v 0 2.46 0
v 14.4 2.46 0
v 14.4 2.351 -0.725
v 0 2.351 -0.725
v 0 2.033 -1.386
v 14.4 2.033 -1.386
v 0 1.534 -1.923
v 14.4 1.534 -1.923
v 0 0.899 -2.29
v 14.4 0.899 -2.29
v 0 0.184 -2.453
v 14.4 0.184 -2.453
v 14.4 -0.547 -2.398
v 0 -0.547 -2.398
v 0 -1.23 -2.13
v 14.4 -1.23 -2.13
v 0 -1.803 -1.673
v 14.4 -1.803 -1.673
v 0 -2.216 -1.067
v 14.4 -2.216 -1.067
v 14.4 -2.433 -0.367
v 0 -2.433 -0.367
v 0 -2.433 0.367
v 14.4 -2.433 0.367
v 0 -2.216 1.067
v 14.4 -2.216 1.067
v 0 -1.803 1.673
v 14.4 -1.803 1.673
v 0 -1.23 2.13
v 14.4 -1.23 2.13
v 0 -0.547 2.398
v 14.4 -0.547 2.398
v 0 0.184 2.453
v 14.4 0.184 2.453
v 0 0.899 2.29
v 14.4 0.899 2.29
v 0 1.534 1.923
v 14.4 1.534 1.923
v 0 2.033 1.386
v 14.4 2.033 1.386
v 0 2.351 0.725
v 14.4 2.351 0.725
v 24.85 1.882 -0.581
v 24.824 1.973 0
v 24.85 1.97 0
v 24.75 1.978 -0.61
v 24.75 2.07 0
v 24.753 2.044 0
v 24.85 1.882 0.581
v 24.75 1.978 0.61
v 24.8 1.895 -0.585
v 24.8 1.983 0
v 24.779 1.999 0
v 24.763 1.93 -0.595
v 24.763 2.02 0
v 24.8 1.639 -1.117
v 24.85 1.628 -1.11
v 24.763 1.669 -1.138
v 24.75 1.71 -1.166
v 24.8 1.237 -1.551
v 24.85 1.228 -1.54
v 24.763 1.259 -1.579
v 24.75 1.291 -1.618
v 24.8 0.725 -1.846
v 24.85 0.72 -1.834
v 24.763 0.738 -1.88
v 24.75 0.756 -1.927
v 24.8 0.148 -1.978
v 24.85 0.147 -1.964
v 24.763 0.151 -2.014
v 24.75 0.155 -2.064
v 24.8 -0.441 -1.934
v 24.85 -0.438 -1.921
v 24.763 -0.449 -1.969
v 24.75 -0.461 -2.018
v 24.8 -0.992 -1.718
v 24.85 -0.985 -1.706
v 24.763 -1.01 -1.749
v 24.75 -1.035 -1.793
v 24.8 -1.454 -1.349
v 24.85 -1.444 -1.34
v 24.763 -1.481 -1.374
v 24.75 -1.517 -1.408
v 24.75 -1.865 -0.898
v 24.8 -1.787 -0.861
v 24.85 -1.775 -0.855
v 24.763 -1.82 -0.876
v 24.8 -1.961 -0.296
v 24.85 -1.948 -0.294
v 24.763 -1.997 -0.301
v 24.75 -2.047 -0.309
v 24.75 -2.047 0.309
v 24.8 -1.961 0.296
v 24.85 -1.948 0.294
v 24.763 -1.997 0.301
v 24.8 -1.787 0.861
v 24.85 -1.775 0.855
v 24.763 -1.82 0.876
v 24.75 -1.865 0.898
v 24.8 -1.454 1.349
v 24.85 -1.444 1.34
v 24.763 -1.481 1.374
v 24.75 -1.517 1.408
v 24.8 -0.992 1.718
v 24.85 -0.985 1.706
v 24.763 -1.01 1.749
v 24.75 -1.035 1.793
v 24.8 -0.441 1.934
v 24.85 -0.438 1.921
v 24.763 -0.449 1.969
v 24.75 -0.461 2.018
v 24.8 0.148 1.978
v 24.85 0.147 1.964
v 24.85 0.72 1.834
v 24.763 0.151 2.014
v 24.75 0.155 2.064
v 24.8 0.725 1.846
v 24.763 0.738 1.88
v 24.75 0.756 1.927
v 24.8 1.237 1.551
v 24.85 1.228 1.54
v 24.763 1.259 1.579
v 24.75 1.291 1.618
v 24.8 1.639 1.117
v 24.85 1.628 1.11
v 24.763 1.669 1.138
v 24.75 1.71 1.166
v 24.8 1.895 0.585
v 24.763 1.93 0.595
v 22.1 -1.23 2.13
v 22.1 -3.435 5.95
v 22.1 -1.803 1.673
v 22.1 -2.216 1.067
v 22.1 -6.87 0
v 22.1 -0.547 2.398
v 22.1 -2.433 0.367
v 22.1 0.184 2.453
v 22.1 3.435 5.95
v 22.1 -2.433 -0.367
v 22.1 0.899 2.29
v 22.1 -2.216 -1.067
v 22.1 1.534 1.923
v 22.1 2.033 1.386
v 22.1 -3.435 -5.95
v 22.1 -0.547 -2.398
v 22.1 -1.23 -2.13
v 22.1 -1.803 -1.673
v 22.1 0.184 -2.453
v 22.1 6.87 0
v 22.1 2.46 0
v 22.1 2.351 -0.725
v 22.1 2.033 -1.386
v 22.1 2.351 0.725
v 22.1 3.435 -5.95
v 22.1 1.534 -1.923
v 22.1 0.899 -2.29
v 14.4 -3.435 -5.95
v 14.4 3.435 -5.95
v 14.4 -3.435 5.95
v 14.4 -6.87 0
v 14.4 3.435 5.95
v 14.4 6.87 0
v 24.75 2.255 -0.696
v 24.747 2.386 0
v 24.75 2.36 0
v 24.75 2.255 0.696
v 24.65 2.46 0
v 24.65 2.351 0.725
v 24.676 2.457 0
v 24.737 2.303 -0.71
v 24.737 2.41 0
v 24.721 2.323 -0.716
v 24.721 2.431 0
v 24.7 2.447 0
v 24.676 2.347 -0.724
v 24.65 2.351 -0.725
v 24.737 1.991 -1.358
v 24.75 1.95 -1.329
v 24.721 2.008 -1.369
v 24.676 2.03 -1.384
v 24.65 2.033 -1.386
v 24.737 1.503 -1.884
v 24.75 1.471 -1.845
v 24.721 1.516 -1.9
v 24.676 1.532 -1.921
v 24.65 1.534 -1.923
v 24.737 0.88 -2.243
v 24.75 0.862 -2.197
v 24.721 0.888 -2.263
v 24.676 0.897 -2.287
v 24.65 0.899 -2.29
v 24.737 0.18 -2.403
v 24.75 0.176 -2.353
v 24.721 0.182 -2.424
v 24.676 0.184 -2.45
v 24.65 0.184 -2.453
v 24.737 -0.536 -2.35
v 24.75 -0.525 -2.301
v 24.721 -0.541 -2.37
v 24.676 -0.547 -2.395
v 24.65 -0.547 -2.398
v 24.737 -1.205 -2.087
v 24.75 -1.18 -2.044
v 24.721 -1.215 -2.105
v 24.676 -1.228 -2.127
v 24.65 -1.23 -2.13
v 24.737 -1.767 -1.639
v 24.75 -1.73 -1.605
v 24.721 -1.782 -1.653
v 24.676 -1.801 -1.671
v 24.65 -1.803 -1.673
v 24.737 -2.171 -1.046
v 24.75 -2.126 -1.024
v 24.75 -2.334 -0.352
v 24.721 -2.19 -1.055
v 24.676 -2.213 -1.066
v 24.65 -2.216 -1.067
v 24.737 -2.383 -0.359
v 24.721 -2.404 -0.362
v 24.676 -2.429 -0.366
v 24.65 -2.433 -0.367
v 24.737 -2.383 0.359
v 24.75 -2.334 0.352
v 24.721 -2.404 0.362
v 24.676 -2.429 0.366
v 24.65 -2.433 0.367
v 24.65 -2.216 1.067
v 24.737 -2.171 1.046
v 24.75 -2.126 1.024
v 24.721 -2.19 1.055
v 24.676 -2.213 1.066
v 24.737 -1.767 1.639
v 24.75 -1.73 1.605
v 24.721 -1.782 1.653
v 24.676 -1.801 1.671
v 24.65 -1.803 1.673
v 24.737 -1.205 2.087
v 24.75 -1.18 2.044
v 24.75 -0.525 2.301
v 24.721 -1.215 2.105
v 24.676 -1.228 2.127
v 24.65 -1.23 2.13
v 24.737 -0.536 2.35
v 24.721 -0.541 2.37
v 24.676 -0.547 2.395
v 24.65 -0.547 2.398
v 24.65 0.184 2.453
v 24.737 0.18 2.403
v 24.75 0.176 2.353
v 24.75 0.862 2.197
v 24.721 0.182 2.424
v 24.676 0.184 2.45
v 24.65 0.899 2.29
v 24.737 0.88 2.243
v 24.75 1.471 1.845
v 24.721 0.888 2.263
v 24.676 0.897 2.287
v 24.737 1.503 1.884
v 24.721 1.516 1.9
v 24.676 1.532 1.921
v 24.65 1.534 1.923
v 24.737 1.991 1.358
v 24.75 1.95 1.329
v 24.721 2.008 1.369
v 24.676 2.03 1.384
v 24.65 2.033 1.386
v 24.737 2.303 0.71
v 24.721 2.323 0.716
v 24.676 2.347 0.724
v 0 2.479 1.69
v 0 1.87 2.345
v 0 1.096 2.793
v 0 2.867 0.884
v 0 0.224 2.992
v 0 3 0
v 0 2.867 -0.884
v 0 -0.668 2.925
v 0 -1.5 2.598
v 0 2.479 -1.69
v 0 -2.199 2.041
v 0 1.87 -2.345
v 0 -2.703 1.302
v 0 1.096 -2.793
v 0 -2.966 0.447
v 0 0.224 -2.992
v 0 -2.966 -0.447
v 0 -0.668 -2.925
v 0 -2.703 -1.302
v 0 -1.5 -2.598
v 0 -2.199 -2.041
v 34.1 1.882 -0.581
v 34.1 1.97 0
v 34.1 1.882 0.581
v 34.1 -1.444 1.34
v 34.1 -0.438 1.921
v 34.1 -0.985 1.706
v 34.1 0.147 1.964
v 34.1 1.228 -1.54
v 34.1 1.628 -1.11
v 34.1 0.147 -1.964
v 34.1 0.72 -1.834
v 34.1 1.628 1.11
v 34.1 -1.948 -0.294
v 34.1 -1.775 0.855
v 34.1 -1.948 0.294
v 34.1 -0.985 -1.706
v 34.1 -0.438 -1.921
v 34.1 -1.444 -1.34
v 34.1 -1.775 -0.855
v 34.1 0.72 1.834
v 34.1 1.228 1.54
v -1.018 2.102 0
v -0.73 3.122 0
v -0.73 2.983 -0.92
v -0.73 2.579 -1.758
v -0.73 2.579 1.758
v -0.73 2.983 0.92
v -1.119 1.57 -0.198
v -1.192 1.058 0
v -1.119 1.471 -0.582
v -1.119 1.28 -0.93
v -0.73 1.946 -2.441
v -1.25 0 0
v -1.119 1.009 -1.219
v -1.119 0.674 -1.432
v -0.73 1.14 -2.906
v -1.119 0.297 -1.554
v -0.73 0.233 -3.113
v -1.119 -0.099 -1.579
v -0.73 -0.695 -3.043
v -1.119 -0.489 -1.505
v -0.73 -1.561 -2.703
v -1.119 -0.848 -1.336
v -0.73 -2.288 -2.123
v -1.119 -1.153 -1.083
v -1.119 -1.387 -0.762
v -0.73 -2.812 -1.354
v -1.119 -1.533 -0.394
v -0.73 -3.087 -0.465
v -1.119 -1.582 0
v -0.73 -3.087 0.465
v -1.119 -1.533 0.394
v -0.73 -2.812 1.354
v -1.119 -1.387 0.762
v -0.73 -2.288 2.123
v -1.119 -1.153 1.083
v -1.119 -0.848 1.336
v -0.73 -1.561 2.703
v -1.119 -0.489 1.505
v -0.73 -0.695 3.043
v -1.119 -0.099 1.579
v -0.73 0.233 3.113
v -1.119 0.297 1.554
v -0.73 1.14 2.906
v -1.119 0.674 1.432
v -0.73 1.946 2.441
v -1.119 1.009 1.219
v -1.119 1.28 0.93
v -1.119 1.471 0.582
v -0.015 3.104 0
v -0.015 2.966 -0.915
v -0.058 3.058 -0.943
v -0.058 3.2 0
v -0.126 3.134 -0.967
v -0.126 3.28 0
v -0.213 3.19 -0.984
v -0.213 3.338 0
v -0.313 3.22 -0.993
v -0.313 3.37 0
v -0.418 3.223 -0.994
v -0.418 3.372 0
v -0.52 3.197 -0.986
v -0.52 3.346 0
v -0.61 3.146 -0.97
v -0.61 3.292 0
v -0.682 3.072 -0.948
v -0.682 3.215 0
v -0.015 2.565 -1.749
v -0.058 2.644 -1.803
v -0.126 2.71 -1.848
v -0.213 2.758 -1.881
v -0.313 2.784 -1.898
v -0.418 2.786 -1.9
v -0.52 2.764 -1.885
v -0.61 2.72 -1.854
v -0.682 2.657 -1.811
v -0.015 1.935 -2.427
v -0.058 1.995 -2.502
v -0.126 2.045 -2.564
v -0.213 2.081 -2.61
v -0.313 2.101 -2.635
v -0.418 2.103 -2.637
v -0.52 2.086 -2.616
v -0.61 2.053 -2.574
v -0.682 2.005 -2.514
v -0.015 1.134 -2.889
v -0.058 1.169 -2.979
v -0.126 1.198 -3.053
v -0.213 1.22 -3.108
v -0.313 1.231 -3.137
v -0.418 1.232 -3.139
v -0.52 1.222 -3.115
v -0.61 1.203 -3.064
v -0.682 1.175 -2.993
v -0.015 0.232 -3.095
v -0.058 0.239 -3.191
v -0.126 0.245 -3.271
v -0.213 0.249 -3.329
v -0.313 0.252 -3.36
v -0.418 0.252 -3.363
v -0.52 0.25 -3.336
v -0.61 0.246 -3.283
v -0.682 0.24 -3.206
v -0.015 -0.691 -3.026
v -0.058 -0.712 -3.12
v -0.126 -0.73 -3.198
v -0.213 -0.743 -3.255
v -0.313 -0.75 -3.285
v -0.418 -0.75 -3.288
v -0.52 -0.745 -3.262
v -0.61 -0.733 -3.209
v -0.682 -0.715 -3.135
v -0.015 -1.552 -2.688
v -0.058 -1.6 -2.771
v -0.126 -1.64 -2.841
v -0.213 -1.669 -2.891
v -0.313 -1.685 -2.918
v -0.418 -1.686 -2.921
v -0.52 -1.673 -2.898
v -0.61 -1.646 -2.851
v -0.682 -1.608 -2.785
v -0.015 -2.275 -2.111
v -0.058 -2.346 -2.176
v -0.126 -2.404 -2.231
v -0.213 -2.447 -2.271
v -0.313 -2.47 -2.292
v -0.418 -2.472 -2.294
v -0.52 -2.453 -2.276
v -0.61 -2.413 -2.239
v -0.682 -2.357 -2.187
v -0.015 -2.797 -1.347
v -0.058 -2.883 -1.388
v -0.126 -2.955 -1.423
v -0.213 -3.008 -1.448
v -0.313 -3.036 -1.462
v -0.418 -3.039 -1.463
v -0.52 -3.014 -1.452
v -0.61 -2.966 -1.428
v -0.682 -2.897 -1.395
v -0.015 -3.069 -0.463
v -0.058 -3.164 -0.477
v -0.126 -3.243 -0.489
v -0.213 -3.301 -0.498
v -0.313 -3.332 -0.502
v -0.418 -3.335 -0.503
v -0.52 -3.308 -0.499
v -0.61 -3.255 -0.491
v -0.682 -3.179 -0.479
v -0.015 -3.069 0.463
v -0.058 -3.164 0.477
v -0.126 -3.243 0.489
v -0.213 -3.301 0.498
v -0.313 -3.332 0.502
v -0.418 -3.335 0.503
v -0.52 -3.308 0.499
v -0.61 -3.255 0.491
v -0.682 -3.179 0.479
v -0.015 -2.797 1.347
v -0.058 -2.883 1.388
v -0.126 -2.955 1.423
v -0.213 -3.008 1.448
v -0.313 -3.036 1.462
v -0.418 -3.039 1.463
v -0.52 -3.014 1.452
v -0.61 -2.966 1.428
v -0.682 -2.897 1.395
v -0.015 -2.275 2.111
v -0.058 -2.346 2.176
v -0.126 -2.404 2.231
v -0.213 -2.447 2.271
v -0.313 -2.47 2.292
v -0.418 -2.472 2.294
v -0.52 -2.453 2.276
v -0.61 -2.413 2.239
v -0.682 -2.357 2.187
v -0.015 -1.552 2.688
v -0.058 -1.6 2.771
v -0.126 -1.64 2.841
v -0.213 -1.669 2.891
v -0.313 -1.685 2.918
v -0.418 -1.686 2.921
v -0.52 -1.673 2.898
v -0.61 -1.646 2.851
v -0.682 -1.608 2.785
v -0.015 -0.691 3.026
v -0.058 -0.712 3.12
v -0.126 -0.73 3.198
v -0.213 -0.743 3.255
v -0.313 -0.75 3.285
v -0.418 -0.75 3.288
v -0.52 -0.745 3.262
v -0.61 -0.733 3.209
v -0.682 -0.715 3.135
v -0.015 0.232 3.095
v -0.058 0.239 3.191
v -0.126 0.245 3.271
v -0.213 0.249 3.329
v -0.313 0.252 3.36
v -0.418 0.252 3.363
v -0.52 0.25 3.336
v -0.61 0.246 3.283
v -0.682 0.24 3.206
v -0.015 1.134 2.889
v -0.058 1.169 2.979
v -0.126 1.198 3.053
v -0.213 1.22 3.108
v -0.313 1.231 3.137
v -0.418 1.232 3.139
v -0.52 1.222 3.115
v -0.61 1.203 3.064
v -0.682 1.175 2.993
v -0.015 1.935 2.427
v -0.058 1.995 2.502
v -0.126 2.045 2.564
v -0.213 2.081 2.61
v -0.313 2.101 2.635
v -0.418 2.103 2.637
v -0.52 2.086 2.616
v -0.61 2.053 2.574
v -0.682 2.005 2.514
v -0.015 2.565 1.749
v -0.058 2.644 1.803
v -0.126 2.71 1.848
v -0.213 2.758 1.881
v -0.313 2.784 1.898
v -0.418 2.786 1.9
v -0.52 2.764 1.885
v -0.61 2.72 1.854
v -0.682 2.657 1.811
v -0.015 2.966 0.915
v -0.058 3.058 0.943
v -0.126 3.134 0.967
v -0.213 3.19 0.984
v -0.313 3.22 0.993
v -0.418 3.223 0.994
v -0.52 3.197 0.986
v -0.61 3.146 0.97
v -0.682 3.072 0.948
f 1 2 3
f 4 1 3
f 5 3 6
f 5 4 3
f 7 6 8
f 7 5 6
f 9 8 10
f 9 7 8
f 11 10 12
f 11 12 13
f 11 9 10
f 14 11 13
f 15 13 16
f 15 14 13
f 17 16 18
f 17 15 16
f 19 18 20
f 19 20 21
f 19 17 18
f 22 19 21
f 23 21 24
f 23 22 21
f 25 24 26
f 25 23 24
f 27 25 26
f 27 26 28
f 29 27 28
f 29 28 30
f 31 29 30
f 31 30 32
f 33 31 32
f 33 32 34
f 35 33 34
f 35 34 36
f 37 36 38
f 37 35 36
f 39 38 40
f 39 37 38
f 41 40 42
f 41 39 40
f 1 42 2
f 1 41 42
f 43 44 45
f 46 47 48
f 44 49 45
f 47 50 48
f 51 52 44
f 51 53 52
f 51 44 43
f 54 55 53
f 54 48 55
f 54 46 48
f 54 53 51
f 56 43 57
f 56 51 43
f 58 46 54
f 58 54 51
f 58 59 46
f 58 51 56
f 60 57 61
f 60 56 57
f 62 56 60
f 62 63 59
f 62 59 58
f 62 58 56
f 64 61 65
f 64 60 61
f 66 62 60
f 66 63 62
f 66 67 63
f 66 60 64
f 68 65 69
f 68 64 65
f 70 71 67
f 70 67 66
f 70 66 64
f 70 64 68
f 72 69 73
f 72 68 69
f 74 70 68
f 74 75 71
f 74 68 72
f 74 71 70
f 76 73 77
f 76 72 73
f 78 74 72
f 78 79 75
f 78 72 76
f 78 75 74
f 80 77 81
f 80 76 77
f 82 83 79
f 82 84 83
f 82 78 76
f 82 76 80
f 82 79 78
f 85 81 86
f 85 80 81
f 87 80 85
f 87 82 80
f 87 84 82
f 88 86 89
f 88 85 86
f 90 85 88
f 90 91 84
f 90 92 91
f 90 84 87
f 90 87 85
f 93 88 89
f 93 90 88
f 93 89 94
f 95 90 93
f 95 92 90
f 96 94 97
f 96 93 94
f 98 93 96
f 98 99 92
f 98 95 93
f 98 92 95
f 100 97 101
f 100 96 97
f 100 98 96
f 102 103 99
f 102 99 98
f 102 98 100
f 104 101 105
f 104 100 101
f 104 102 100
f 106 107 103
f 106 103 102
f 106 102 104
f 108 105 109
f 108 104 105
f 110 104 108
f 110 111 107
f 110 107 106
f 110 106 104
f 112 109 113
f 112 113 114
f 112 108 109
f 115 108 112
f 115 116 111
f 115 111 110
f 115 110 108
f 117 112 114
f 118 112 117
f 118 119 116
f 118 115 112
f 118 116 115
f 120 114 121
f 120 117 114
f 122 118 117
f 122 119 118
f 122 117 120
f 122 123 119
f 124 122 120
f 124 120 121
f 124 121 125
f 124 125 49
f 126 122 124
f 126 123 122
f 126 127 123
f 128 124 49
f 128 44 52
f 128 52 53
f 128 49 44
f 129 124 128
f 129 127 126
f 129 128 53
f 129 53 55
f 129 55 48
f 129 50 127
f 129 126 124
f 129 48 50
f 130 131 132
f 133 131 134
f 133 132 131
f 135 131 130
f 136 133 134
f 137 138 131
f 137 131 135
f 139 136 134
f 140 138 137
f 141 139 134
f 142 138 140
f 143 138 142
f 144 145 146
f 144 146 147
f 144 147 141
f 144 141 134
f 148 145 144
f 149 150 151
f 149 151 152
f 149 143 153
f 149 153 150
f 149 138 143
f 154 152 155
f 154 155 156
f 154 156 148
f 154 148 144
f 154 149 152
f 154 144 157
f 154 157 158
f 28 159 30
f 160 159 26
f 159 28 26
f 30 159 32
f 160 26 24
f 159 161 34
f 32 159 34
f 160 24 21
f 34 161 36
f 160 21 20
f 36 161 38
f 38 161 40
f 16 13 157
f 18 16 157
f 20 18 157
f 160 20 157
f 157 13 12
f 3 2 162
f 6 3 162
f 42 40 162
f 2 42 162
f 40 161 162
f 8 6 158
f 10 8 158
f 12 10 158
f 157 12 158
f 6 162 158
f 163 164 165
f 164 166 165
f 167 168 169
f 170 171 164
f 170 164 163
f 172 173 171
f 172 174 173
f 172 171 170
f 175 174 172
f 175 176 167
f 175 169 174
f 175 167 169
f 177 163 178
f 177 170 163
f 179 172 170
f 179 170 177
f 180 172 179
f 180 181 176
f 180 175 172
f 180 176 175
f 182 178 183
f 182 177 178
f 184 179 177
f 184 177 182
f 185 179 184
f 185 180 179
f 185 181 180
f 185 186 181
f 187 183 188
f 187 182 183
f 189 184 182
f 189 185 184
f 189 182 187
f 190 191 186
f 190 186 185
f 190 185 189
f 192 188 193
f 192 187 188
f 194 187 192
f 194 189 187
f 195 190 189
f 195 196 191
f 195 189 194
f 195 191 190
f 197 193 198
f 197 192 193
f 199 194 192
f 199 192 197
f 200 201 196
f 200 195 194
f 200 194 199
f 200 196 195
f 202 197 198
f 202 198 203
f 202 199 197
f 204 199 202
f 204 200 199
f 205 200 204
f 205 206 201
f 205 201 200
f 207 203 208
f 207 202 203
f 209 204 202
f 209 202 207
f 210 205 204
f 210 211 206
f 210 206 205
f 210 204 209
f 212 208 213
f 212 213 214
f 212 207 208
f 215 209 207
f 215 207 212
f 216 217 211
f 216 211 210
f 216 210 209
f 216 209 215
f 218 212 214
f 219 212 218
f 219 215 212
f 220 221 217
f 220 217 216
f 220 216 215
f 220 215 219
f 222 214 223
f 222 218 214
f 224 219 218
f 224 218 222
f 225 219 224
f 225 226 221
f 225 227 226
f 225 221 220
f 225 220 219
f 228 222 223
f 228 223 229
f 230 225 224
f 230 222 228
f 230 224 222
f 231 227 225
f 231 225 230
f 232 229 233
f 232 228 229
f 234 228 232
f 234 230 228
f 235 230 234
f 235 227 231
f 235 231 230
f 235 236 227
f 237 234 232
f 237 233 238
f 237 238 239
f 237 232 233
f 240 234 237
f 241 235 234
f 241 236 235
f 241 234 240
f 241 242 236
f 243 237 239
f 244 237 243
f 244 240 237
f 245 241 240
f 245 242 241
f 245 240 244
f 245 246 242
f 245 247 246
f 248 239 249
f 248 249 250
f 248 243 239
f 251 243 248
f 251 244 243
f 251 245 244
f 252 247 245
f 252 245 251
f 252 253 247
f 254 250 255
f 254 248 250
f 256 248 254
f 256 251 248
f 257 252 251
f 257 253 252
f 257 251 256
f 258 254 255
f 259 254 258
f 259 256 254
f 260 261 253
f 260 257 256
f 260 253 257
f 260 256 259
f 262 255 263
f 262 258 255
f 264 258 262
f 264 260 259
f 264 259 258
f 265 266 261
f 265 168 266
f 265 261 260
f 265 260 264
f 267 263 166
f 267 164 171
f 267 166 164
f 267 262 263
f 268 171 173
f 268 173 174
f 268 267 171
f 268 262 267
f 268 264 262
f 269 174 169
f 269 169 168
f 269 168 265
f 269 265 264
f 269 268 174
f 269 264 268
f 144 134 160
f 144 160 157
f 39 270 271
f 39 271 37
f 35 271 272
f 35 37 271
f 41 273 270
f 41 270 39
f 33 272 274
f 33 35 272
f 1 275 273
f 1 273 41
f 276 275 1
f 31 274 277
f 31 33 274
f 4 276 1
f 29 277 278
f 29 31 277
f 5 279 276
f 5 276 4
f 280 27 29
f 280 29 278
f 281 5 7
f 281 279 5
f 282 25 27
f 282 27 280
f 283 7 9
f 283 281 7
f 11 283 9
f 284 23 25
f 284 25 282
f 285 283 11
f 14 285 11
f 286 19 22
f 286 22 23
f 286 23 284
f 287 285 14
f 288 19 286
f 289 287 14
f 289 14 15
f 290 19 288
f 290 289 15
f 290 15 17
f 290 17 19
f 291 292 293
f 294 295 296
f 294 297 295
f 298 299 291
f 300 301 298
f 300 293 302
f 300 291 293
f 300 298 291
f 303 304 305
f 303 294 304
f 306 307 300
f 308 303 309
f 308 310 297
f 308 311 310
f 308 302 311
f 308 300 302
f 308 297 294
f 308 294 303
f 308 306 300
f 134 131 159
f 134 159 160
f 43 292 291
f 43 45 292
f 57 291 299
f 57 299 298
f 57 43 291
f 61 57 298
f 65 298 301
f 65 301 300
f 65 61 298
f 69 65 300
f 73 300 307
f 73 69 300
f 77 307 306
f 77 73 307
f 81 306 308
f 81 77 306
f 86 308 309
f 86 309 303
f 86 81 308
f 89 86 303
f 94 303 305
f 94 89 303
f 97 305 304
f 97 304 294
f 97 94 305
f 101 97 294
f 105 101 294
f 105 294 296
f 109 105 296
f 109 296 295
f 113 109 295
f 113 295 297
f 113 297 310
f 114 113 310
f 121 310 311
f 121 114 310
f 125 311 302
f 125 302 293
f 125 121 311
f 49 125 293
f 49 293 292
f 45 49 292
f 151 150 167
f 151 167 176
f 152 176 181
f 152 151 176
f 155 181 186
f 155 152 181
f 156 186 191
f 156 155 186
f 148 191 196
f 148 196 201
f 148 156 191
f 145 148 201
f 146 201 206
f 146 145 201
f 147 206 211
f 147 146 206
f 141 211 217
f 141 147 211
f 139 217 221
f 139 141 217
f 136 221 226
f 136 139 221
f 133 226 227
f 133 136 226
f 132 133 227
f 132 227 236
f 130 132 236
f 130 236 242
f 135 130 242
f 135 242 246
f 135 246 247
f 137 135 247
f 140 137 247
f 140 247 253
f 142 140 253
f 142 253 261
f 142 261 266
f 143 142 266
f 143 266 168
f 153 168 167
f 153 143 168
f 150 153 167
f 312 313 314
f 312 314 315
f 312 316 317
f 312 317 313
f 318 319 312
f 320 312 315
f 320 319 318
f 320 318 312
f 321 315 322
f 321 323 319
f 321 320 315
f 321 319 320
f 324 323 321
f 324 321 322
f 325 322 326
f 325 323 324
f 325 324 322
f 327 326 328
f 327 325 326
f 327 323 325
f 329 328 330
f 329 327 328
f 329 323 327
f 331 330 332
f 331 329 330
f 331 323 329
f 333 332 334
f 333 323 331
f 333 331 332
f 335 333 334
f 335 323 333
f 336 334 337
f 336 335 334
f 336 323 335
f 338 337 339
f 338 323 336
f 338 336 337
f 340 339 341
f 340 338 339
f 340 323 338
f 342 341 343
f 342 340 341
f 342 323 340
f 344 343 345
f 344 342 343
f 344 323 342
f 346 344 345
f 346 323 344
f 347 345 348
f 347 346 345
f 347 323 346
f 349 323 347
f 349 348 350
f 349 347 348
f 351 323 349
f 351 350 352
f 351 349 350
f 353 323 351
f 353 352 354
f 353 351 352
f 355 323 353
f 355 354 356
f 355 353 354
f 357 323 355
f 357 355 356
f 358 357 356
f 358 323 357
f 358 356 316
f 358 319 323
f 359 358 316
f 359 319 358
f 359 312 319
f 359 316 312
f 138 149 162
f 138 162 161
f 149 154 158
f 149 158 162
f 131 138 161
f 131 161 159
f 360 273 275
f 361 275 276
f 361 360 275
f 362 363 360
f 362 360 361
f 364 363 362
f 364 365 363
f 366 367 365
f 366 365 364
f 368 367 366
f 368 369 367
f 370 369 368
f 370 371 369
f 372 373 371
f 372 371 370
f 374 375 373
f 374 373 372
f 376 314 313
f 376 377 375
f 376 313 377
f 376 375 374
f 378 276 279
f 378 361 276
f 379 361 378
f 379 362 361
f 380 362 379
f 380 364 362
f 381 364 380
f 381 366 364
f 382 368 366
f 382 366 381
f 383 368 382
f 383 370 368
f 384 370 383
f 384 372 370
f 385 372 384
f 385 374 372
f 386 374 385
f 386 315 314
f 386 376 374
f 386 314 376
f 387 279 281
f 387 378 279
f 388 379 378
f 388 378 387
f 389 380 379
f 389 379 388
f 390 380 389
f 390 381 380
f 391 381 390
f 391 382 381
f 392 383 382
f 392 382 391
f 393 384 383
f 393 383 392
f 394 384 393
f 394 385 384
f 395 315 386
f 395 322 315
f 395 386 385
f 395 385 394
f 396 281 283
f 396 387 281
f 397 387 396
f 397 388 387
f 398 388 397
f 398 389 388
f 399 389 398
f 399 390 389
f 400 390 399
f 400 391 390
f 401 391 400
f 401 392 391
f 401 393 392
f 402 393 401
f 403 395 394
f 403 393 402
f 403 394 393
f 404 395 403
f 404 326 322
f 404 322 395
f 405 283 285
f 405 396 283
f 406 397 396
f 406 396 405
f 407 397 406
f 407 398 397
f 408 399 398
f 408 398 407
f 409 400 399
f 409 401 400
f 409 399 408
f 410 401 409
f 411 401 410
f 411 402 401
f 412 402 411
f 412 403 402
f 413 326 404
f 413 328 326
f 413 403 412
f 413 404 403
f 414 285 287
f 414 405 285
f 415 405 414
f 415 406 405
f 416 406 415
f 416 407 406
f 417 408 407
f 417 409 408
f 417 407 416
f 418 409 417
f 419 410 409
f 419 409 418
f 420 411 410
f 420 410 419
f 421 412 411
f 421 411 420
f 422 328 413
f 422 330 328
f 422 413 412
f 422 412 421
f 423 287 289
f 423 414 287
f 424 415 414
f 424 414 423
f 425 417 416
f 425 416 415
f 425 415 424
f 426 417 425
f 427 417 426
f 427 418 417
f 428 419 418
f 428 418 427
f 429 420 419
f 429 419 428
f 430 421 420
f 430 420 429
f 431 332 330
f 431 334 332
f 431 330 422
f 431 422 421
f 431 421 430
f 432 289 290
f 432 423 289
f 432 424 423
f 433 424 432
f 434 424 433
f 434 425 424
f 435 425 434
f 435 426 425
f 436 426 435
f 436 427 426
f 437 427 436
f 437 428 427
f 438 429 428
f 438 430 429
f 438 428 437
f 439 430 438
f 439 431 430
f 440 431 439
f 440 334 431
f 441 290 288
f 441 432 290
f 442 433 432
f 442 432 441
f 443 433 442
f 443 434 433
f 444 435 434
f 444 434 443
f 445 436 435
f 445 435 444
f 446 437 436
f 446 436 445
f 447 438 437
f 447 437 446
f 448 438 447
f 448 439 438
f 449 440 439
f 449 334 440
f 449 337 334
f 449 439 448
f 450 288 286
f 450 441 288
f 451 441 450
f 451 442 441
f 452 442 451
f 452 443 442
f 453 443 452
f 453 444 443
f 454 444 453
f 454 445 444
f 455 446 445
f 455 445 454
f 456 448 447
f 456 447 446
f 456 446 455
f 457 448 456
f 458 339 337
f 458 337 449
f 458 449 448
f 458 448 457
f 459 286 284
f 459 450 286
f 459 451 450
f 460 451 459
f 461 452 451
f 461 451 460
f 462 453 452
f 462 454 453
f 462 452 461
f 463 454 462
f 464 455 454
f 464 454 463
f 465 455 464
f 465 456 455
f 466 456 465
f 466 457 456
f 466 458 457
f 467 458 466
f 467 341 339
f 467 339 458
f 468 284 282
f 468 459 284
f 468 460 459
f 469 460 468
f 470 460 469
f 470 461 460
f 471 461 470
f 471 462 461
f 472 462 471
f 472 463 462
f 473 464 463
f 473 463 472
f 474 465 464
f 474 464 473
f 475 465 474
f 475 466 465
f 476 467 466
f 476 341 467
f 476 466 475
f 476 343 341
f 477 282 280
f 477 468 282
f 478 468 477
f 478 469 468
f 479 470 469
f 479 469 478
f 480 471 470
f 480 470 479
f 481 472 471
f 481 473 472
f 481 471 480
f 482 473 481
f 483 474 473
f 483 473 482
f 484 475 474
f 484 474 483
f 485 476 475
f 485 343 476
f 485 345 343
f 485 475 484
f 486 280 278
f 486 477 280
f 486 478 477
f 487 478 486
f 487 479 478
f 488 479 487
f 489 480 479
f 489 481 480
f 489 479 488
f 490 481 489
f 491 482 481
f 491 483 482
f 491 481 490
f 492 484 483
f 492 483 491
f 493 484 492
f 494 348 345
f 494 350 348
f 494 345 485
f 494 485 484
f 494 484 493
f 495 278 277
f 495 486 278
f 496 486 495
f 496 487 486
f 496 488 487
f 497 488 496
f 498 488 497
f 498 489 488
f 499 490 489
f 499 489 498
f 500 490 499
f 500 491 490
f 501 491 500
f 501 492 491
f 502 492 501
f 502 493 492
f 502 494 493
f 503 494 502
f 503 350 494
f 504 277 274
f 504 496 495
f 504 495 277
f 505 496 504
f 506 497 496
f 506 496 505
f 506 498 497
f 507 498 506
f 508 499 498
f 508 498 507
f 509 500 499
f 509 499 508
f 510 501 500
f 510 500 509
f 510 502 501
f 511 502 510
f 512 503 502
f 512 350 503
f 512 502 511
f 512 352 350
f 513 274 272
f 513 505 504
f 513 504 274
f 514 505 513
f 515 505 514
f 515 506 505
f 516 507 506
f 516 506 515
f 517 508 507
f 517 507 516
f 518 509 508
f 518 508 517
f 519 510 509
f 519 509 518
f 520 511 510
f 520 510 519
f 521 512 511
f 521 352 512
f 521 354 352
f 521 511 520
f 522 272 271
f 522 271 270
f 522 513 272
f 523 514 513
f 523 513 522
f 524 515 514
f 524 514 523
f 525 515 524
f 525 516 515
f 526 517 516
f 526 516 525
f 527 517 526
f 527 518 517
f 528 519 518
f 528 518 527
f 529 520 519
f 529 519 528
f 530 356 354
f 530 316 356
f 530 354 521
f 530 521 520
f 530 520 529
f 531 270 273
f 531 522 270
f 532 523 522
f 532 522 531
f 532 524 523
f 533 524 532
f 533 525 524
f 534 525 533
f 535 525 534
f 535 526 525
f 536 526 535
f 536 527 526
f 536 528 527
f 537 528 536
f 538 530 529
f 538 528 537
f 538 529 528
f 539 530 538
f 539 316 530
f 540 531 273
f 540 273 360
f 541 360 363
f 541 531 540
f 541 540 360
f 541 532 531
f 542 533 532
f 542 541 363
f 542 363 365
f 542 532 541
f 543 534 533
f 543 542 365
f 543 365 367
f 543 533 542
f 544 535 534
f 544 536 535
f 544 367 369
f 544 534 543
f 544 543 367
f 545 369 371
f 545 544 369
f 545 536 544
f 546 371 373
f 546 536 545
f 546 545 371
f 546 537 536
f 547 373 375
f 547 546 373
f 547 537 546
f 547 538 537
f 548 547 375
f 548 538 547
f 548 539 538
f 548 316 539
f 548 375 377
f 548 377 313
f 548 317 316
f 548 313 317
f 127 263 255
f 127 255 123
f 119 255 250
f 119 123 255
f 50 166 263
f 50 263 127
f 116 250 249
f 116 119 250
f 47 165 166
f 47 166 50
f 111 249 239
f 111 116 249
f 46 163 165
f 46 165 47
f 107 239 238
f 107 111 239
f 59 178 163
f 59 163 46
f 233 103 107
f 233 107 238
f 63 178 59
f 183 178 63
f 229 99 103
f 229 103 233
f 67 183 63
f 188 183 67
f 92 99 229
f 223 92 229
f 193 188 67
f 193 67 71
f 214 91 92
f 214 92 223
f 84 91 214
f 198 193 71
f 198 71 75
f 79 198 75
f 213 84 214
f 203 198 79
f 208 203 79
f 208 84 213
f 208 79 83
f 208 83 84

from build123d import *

# Parameters (mm, degrees)
BOSS_EXTRUDE1_DEPTH = 7.7


with BuildPart() as part:
    # Sketch1 → Revolve1 (revolve)
    with BuildSketch(Plane.XY):
        with BuildLine():
            Line((0, 2.46), (0, 3))
            ThreePointArc((0, 3), (-0.31335038, 3.369897721), (-0.72972973, 3.121621622))
            ThreePointArc((-0.72972973, 3.121621622), (-1.119041517, 1.582340253), (-1.25, 0))
            Line((-1.25, 0), (34.1, 0))
            Line((34.1, 0), (34.1, 1.97))
            Line((34.1, 1.97), (24.85, 1.97))
            ThreePointArc((24.85, 1.97), (24.779289322, 1.999289322), (24.75, 2.07))
            Line((24.75, 2.07), (24.75, 2.36))
            ThreePointArc((24.75, 2.36), (24.720710678, 2.430710678), (24.65, 2.46))
            Line((24.65, 2.46), (0, 2.46))
        make_face()
    revolve(axis=Axis((34.1, 0, 0), (-1, 0, 0)))

    # Sketch2 → Boss-Extrude1 (add)
    with BuildSketch(Plane(origin=(22.1, 0, 0), x_dir=(0, 0, -1), z_dir=(1, 0, 0))):
        Polygon((-5.95, 3.435234102), (-5.95, -3.435234102), (0, -6.870468203), (5.95, -3.435234102), (5.95, 3.435234102), (0, 6.870468203), align=None)
    extrude(amount=-BOSS_EXTRUDE1_DEPTH)


solid = part.part
